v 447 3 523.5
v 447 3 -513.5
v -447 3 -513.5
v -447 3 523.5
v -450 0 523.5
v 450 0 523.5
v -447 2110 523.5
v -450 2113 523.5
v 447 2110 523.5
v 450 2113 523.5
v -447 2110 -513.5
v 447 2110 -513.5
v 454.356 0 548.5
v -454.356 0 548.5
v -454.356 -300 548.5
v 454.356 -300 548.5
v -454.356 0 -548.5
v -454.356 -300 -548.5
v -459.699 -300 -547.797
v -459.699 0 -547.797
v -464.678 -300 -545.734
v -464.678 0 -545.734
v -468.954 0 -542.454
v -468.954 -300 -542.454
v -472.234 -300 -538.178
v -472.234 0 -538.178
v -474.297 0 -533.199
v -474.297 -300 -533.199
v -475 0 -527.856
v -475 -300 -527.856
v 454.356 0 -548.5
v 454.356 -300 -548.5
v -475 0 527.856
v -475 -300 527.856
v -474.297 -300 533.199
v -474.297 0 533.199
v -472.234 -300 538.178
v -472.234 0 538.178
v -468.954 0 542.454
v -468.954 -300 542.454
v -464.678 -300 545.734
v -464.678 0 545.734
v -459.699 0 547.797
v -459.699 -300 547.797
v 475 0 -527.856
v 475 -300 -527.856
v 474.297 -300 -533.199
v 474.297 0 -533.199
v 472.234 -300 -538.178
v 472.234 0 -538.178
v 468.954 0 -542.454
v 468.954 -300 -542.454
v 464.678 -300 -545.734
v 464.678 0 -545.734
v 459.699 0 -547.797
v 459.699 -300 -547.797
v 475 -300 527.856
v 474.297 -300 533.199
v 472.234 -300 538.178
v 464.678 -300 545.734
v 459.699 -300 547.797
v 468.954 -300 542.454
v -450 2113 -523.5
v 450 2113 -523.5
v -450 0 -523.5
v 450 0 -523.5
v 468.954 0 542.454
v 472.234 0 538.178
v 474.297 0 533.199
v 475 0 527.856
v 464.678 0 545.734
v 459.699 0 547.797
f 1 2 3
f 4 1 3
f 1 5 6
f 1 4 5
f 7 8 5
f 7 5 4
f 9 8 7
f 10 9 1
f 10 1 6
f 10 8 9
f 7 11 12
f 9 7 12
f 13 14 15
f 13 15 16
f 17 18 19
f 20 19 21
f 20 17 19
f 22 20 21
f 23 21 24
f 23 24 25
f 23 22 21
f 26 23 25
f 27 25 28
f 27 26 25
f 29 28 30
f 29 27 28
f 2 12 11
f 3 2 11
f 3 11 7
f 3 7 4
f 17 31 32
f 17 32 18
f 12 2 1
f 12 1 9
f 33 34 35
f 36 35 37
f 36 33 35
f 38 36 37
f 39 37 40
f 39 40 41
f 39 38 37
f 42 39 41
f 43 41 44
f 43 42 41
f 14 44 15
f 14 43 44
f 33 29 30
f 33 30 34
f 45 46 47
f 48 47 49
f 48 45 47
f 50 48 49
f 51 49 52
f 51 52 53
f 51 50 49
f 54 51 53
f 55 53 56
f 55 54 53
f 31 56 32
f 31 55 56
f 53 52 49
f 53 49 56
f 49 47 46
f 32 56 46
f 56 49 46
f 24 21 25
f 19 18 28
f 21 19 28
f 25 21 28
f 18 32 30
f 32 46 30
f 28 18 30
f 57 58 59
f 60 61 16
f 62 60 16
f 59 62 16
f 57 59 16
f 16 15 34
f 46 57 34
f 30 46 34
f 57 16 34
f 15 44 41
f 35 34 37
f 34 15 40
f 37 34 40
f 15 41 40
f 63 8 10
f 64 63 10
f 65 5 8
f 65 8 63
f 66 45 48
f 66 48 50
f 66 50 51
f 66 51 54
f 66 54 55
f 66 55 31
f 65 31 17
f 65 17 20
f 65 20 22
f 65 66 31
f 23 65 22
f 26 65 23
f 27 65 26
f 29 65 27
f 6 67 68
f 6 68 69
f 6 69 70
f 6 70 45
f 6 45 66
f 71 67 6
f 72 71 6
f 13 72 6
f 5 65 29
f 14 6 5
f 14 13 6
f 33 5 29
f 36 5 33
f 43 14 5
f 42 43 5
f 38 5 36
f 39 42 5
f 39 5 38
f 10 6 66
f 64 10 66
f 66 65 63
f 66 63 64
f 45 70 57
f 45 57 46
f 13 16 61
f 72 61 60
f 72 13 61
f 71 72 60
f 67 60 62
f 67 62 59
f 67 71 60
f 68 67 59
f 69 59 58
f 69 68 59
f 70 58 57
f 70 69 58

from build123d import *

# Parameters (mm, degrees)
CROQUIS1_W              = 900
CROQUIS1_H              = 1047
SALIENTE_EXTRUIR1_DEPTH = 2113
VACIADO2_T              = -10
CROQUIS2_W              = 880
CROQUIS2_H              = 2093
SALIENTE_EXTRUIR2_DEPTH = 5
SALIENTE_EXTRUIR3_DEPTH = 300
CORTAR_EXTRUIR1_DEPTH   = 1044


with BuildPart() as part:
    # Croquis1 → Saliente-Extruir1 (new body)
    with BuildSketch(Plane(origin=(0, 0, 0), x_dir=(1, 0, 0), z_dir=(0, 1, 0))):
        Rectangle(CROQUIS1_W, CROQUIS1_H)
    extrude(amount=SALIENTE_EXTRUIR1_DEPTH)

    # Vaciado2
    vaciado2_openings = [part.faces().sort_by_distance(p)[0] for p in [
        (0, 1056.5, 523.5),
    ]]
    offset(amount=VACIADO2_T, openings=vaciado2_openings, kind=Kind.INTERSECTION)

    # Croquis2 → Saliente-Extruir2 (add)
    with BuildSketch(Plane.XY.offset(523.5)):
        with Locations((0, 1056.5)):
            Rectangle(CROQUIS2_W, CROQUIS2_H)
    extrude(amount=-SALIENTE_EXTRUIR2_DEPTH)

    # Croquis4 → Saliente-Extruir3 (add)
    with BuildSketch(Plane.XZ):
        with BuildLine():
            Line((-454.35645152, 548.5), (454.35645152, 548.5))
            ThreePointArc((454.35645152, 548.5), (468.953644638, 542.453644638), (475, 527.85645152))
            Line((475, 527.85645152), (475, -527.85645152))
            ThreePointArc((475, -527.85645152), (468.953644638, -542.453644638), (454.35645152, -548.5))
            Line((454.35645152, -548.5), (-454.35645152, -548.5))
            ThreePointArc((-454.35645152, -548.5), (-468.953644638, -542.453644638), (-475, -527.85645152))
            Line((-475, -527.85645152), (-475, 527.85645152))
            ThreePointArc((-475, 527.85645152), (-468.953644638, 542.453644638), (-454.35645152, 548.5))
        make_face()
    extrude(amount=SALIENTE_EXTRUIR3_DEPTH)

    # Croquis5 → Cortar-Extruir1 (cut)
    with BuildSketch(Plane.XY.offset(-513.5)):
        Polygon((-447, 10), (-447, 2110), (447, 2110), (447, 10), (447, 3), (-447, 3), align=None)
    extrude(amount=CORTAR_EXTRUIR1_DEPTH, mode=Mode.SUBTRACT)


solid = part.part
